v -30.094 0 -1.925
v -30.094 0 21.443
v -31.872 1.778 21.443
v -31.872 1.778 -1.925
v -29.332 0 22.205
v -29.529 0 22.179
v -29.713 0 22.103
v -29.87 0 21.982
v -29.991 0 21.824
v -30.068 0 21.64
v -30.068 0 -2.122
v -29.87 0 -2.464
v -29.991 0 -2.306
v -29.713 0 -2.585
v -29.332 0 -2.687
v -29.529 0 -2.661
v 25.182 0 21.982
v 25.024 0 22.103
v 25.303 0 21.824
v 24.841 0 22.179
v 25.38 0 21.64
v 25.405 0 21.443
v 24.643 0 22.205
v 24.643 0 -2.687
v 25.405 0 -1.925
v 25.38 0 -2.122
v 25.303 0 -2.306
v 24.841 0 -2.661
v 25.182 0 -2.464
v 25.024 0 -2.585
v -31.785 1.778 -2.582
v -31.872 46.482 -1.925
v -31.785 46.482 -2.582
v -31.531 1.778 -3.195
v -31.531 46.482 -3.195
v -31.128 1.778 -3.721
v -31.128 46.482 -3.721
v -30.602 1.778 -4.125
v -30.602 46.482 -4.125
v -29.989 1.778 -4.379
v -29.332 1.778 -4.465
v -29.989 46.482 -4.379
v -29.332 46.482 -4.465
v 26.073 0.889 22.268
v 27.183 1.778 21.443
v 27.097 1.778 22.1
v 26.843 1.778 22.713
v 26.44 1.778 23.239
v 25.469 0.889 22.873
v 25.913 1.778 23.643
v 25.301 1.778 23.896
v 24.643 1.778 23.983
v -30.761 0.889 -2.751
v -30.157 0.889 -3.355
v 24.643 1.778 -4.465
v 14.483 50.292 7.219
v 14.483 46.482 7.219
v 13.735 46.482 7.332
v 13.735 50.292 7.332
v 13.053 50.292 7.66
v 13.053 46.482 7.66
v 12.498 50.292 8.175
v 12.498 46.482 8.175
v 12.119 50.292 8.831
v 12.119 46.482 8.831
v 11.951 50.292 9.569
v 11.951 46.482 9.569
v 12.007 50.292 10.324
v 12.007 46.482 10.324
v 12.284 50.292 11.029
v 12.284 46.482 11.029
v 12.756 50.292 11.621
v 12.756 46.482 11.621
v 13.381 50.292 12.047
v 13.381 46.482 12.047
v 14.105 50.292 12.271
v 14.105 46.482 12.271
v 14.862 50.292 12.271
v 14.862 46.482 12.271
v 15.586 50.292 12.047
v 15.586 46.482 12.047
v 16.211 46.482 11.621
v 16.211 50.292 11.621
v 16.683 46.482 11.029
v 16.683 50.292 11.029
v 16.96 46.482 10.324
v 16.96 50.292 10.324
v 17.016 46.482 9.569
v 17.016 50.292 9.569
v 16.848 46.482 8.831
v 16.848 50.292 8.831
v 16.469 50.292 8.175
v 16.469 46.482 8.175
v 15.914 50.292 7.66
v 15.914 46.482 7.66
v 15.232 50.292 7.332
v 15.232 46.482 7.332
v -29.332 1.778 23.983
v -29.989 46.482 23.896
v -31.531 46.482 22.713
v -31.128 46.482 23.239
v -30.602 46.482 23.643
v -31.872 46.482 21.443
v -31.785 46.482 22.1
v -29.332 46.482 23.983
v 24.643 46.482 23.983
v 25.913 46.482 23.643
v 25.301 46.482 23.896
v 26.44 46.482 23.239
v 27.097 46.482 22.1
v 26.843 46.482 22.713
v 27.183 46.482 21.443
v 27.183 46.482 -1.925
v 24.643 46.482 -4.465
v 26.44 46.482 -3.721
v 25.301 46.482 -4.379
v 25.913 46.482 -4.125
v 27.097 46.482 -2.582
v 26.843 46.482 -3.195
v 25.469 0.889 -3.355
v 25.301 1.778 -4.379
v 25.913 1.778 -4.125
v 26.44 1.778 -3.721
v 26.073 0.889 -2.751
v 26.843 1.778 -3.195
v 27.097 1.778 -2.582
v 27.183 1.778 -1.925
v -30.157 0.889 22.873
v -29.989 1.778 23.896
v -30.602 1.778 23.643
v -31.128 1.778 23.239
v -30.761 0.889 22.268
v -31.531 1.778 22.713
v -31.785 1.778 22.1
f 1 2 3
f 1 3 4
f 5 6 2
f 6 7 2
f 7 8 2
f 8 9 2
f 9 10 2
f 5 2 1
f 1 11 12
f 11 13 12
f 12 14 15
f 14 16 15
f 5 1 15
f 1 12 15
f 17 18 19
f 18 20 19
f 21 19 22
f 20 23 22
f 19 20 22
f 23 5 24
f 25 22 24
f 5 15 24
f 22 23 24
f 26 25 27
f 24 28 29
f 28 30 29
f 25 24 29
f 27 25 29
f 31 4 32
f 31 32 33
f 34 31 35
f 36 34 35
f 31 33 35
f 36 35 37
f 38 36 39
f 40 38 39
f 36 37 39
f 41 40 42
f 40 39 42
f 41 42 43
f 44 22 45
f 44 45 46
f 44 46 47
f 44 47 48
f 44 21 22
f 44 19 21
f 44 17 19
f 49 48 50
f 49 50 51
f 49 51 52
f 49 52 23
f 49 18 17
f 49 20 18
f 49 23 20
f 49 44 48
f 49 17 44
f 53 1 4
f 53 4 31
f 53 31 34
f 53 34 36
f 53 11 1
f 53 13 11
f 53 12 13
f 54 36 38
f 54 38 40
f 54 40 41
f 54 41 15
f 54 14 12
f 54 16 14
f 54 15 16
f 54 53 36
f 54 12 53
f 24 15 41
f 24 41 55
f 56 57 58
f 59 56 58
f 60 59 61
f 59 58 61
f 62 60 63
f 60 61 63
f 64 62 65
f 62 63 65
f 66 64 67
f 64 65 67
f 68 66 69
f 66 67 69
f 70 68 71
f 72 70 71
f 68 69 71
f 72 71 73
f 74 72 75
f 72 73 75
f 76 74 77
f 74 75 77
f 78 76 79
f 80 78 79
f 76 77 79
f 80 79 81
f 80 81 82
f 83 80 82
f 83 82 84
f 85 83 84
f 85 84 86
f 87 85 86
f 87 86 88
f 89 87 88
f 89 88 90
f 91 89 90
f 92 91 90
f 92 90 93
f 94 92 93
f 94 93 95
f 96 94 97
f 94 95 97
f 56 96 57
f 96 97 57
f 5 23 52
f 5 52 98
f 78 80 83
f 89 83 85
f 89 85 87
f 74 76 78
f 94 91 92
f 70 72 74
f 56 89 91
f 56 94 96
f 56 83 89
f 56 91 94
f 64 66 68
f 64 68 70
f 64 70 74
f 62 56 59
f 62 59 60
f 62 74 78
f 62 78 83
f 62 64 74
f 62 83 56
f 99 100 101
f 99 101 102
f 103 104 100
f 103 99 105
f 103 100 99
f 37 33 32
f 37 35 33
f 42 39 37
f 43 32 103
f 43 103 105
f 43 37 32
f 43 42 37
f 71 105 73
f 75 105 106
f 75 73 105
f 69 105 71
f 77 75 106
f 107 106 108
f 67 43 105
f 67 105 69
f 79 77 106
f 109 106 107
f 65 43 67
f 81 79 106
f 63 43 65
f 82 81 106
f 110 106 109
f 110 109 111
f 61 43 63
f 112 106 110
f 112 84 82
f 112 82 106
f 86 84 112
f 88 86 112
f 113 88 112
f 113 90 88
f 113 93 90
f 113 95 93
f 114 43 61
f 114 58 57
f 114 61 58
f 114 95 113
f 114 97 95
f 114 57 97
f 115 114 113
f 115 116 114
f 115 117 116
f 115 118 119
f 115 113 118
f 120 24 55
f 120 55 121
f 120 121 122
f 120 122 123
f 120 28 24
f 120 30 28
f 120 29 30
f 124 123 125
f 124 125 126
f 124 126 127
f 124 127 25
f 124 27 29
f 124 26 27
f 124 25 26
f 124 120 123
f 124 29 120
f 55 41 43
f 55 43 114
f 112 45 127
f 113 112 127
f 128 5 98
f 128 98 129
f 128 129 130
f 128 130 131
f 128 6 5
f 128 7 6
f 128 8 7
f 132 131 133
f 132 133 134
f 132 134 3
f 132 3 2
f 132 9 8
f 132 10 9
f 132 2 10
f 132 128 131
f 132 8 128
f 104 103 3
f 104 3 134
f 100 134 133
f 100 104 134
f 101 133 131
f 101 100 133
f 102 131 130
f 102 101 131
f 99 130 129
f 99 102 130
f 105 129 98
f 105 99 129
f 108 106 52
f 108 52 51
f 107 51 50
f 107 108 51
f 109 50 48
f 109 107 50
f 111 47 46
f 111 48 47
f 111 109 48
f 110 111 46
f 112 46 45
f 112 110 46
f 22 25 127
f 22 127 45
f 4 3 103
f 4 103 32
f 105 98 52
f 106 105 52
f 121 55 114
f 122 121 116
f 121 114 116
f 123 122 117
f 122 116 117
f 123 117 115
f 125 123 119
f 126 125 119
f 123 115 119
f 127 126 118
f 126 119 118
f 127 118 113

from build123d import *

# Parameters (mm, degrees)
SKETCH1_W           = 59.055
SKETCH1_H           = 28.448
BOSS_EXTRUDE1_DEPTH = 46.482
SKETCH2_R           = 2.54
BOSS_EXTRUDE2_DEPTH = 3.81
FILLET1_R           = 2.54
CHAMFER1_SIZE       = 1.778


with BuildPart() as part:
    # Sketch1 → Boss-Extrude1 (new body)
    with BuildSketch(Plane(origin=(0, 0, 0), x_dir=(1, 0, 0), z_dir=(0, 1, 0))):
        with Locations((-2.344011553, -9.758904569)):
            Rectangle(SKETCH1_W, SKETCH1_H)
    extrude(amount=BOSS_EXTRUDE1_DEPTH)

    # Sketch2 → Boss-Extrude2 (add)
    with BuildSketch(Plane(origin=(0, 46.482, 0), x_dir=(1, 0, 0), z_dir=(0, 1, 0))):
        with Locations(Location((14.483488447, -9.758904569, 0), (0, 0, 90))):
            Circle(SKETCH2_R)
    extrude(amount=BOSS_EXTRUDE2_DEPTH)

    # Fillet1
    fillet1_edges = [part.edges().sort_by_distance(p)[0] for p in [
        (-31.871511553, 23.241, -4.465095431),
        (27.183488447, 23.241, -4.465095431),
        (27.183488447, 23.241, 23.982904569),
        (-31.871511553, 23.241, 23.982904569),
    ]]
    fillet(fillet1_edges, radius=FILLET1_R)

    # Chamfer1
    chamfer1_edges = [part.edges().sort_by_distance(p)[0] for p in [
        (-31.871511553, 0, 9.758904569),
        (-2.344011553, 0, -4.465095431),
        (27.183488447, 0, 9.758904569),
        (-2.344011553, 0, 23.982904569),
        (-31.127562777, 0, 23.238955793),
        (26.439539672, 0, 23.238955793),
        (26.439539672, 0, -3.721146655),
        (-31.127562777, 0, -3.721146655),
    ]]
    chamfer(chamfer1_edges, length=CHAMFER1_SIZE)


solid = part.part
